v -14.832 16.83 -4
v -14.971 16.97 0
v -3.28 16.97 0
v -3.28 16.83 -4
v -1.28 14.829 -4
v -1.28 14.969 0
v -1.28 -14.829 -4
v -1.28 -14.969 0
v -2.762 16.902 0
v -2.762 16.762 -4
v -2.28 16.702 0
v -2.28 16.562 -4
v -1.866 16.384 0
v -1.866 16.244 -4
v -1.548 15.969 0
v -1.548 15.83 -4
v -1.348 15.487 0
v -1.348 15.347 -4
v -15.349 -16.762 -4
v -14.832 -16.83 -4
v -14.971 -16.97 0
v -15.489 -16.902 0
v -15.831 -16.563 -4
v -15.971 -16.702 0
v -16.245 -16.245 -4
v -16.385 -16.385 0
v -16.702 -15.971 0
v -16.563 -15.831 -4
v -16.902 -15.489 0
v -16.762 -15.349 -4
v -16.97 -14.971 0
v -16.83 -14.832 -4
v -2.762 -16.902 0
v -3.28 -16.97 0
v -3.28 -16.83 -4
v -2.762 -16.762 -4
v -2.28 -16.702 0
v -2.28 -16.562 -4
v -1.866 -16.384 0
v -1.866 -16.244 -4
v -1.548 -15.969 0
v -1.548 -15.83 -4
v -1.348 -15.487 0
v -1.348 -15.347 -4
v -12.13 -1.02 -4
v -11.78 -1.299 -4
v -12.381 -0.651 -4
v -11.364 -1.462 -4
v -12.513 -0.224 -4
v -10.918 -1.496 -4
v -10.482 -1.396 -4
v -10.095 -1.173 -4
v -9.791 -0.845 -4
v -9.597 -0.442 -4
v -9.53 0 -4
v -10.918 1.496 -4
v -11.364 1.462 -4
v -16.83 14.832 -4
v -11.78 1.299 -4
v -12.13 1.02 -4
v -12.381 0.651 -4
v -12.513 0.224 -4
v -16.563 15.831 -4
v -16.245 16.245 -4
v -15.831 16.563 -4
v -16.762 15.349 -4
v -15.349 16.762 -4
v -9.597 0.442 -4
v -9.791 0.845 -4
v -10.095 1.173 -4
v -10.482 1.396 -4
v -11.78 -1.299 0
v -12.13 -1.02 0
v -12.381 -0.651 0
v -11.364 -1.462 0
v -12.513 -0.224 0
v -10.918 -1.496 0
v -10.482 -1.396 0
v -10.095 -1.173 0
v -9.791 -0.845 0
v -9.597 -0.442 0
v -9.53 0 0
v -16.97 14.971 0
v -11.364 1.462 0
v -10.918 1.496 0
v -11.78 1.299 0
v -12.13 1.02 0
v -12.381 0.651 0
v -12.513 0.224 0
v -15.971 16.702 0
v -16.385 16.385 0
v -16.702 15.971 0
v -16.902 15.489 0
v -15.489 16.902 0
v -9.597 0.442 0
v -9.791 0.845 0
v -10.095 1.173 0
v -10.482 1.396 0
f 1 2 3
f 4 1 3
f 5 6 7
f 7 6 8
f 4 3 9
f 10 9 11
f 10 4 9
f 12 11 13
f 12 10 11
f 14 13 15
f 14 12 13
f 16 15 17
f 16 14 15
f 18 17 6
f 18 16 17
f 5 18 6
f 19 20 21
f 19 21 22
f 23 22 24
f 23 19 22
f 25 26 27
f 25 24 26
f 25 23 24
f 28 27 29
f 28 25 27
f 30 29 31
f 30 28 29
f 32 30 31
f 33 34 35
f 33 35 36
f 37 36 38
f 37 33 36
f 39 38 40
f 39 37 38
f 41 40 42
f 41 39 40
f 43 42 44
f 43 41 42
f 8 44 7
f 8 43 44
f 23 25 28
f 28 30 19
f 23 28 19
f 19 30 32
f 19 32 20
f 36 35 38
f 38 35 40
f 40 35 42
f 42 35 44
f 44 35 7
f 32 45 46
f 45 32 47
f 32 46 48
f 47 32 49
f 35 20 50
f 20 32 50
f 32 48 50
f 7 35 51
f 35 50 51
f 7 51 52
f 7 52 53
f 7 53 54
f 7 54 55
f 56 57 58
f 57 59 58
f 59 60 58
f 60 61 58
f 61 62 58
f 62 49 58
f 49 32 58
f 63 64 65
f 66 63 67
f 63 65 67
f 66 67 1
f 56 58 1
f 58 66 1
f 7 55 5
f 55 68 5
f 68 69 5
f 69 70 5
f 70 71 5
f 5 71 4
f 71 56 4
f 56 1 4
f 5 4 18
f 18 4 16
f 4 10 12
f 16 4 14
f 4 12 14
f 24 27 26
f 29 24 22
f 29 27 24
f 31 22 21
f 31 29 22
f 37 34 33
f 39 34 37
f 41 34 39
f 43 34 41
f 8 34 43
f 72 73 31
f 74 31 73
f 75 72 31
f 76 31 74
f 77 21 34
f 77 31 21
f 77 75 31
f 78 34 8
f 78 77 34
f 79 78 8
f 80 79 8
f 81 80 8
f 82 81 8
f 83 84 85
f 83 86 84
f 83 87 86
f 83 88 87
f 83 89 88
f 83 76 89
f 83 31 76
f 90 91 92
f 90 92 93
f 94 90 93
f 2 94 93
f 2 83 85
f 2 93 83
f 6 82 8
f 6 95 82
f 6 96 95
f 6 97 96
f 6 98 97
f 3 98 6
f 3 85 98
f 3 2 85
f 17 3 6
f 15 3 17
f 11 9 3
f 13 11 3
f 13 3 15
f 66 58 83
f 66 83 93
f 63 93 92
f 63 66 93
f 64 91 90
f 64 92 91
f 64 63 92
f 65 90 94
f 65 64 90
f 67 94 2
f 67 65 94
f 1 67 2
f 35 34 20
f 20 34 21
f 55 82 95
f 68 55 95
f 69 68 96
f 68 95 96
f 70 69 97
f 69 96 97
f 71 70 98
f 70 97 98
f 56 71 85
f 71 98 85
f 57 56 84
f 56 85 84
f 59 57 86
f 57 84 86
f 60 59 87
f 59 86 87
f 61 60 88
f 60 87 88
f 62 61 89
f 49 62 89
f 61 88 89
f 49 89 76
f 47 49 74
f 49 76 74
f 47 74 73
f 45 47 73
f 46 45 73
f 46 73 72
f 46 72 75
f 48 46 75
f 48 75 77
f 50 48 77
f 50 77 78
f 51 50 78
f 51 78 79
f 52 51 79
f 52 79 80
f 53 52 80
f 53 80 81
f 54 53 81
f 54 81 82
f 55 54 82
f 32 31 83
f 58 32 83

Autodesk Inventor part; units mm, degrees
ref_plane "YZ Plane" through (0, 0, 0) normal (1, 0, 0) x (0, 1, 0)
ref_plane "XZ Plane" through (0, 0, 0) normal (0, 1, 0) x (-1, 0, 0)
ref_plane "XY Plane" through (0, 0, 0) normal (0, 0, 1) x (1, 0, 0)
ref_plane "Arbeitsebene1" through (0, 0, 0) normal (0, 0, 1) x (1, 0, 0)
sketch "Skizze1" plane through (0, 0, 0) normal (0, 0, 1) x (1, 0, 0)
  line L0 (20.3781, -18.1328) -> (23.4454, -18.9546) construction
  line L1 (23.4454, -18.9546) -> (24.2672, -22.0219) construction
  line L2 (24.2672, -22.0219) -> (22.0219, -24.2672) construction
  line L3 (22.0219, -24.2672) -> (18.9546, -23.4454) construction
  line L4 (18.9546, -23.4454) -> (18.1328, -20.3781) construction
  line L5 (18.1328, -20.3781) -> (20.3781, -18.1328) construction
  line L6 (-24.2672, 22.0219) -> (-22.0219, 24.2672) construction
  line L7 (-22.0219, 24.2672) -> (-18.9546, 23.4454) construction
  line L8 (-18.9546, 23.4454) -> (-18.1328, 20.3781) construction
  line L9 (-18.1328, 20.3781) -> (-20.3781, 18.1328) construction
  line L10 (-20.3781, 18.1328) -> (-23.4454, 18.9546) construction
  line L11 (-23.4454, 18.9546) -> (-24.2672, 22.0219) construction
  circle A0 centre (20.66, 14.3) radius 2.475 construction
  circle A1 centre (14.3, -20.66) radius 2.475 construction
  circle A2 centre (-20.66, -14.3) radius 2.475 construction
  circle A3 centre (-14.3, 20.66) radius 2.475 construction
  circle A4 centre (14.3, 20.66) radius 2.475 construction
  circle A5 centre (-20.66, 14.3) radius 2.475 construction
  circle A6 centre (-14.3, -20.66) radius 2.475 construction
  circle A7 centre (20.66, -14.3) radius 2.475 construction
  arc A8 (-8.8, -18.96) -> (-8.8, -22.36) centre (-8.8, -20.66) ccw construction
  line L12 (-8.8, -18.96) -> (8.8, -18.96) construction
  arc A9 (8.8, -22.36) -> (8.8, -18.96) centre (8.8, -20.66) ccw construction
  line L13 (8.8, -22.36) -> (-8.8, -22.36) construction
  arc A10 (-8.8, 22.36) -> (-8.8, 18.96) centre (-8.8, 20.66) ccw construction
  line L14 (-8.8, 22.36) -> (8.8, 22.36) construction
  arc A11 (8.8, 18.96) -> (8.8, 22.36) centre (8.8, 20.66) ccw construction
  line L15 (8.8, 18.96) -> (-8.8, 18.96) construction
  arc A12 (-18.96, 8.8) -> (-22.36, 8.8) centre (-20.66, 8.8) ccw construction
  line L16 (-18.96, 8.8) -> (-18.96, -8.8) construction
  arc A13 (-22.36, -8.8) -> (-18.96, -8.8) centre (-20.66, -8.8) ccw construction
  line L17 (-22.36, -8.8) -> (-22.36, 8.8) construction
  arc A14 (18.96, -8.8) -> (22.36, -8.8) centre (20.66, -8.8) ccw construction
  line L18 (18.96, -8.8) -> (18.96, 8.8) construction
  arc A15 (22.36, 8.8) -> (18.96, 8.8) centre (20.66, 8.8) ccw construction
  line L19 (22.36, 8.8) -> (22.36, -8.8) construction
  line L20 (-16.97, -16.97) -> (-16.97, 16.97) construction
  line L21 (-16.97, 16.97) -> (16.97, 16.97) construction
  line L22 (16.97, 16.97) -> (16.97, -16.97) construction
  line L23 (16.97, -16.97) -> (-16.97, -16.97) construction
  circle A16 centre (-21.2, -21.2) radius 2.75 construction
  circle A17 centre (21.2, 21.2) radius 2.75 construction
  arc A18 (-24.35, -22.85) -> (-22.85, -24.35) centre (-22.85, -22.85) ccw construction
  line L24 (22.85, -24.35) -> (-22.85, -24.35) construction
  arc A19 (22.85, -24.35) -> (24.35, -22.85) centre (22.85, -22.85) ccw construction
  line L25 (24.35, 22.85) -> (24.35, -22.85) construction
  arc A20 (24.35, 22.85) -> (22.85, 24.35) centre (22.85, 22.85) ccw construction
  line L26 (-22.85, 24.35) -> (22.85, 24.35) construction
  arc A21 (-22.85, 24.35) -> (-24.35, 22.85) centre (-22.85, 22.85) ccw construction
  line L27 (-24.35, -22.85) -> (-24.35, 22.85) construction
  line L28 (-16.97, 16.97) -> (16.97, 16.97)
  line L29 (16.97, 16.97) -> (16.97, -16.97)
  line L30 (16.97, -16.97) -> (-16.97, -16.97)
  line L31 (-16.97, -16.97) -> (-16.97, 16.97)
  point P0 (0, 0)
extrude "Extrusion1" add sketch "Skizze1" against normal blind 4 draft -2
sketch "Skizze2" plane through (0, 0, 0) normal (0, 0, 1) x (1, 0, 0)
  circle A0 centre (-11.03, 0) radius 2.5 projected
  circle A1 centre (-11.03, 0) radius 1.5
  point P0 (0, 0)
  dimension "d3" = 3
extrude "Extrusion2" cut sketch "Skizze2" against normal blind 4 contours A1
fillet "Rundung1" radius 2 4 edges at (-16.9002, -16.9002, -2) (16.9002, -16.9002, -2) (16.9002, 16.9002, -2) (-16.9002, 16.9002, -2)
sketch "Skizze3" plane through (0, 0, 0) normal (0, 0, 1) x (1, 0, 0)
  circle A0 centre (28.0867, -9.6825) radius 1.4 construction
  circle A1 centre (33.0867, 9.6314) radius 1.4 construction
  circle A2 centre (33.0867, -9.6825) radius 1.4 construction
  circle A3 centre (28.0867, 9.6314) radius 1.4 construction
  circle A4 centre (-11.03, 0) radius 3 construction
  circle A5 centre (0.47, 11.5) radius 1.75 construction
  circle A6 centre (0.47, -11.5) radius 1.75 construction
  line L0 (14.4713, 6.5256) -> (36.5731, 6.5256) construction
  line L1 (36.5731, 16.4952) -> (36.5731, 6.5256) construction
  line L2 (-2.8633, 16.4952) -> (36.5731, 16.4952) construction
  line L3 (-24.53, 3.4952) -> (-2.8633, 16.4952) construction
  line L4 (-24.53, 3.4952) -> (-24.53, -3.4952) construction
  line L5 (-24.53, -3.4952) -> (-2.8633, -16.4952) construction
  line L6 (-2.8633, -16.4952) -> (36.5731, -16.4952) construction
  line L7 (36.5731, -16.4952) -> (36.5731, -6.4744) construction
  line L8 (36.5731, -6.4744) -> (14.4713, -6.4744) construction
  line L9 (14.4713, -6.4744) -> (14.4713, -13.5) construction
  line L10 (14.4713, -13.5) -> (4.1713, -13.5) construction
  line L11 (4.1713, -13.5) -> (4.1713, 13.5) construction
  line L12 (4.1713, 13.5) -> (14.4713, 13.5) construction
  line L13 (14.4713, 13.5) -> (14.4713, 6.5256) construction
  circle A7 centre (-11.03, 0) radius 1.5 construction
  ellipse E0 centre (-14.9688, 14.9688) end of major axis (-16.3847, 16.3847) minor radius 2 (-14.9712, 16.97) -> (-16.97, 14.9712) ccw construction
  line L14 (-16.97, 14.9712) -> (-16.97, -14.9712) construction
  ellipse E1 centre (-14.9688, -14.9688) end of major axis (-16.3847, -16.3847) minor radius 2 (-16.97, -14.9712) -> (-14.9712, -16.97) ccw construction
  line L15 (-14.9712, -16.97) -> (14.9712, -16.97) construction
  ellipse E2 centre (14.9688, -14.9688) end of major axis (16.3847, -16.3847) minor radius 2 (14.9712, -16.97) -> (16.97, -14.9712) ccw construction
  line L16 (16.97, -14.9712) -> (16.97, 14.9712) construction
  ellipse E3 centre (14.9688, 14.9688) end of major axis (16.3847, 16.3847) minor radius 2 (16.97, 14.9712) -> (14.9712, 16.97) ccw construction
  line L17 (14.9712, 16.97) -> (-14.9712, 16.97) construction
  line L18 (-14.8315, -16.8303) -> (14.8315, -16.8303) projected
  line L19 (16.97, 16.97) -> (-1.28, 16.97)
  line L20 (-1.28, 16.97) -> (-1.28, -16.8303)
  line L21 (-1.28, -16.8303) -> (16.97, -16.8303)
  line L22 (16.97, -16.8303) -> (16.97, 16.97)
  line L23 (-14.9712, -16.97) -> (14.9712, -16.97) projected
  line L24 (16.97, -16.8303) -> (-1.28, -16.8303)
  line L25 (-1.28, -16.8303) -> (-1.28, -16.97)
  line L26 (-1.28, -16.97) -> (16.97, -16.97)
  line L27 (16.97, -16.97) -> (16.97, -16.8303)
  point P0 (0, 0)
  point P1 (14.8315, -16.8303)
extrude "Extrusion3" cut sketch "Skizze3" against normal blind 4
fillet "Rundung2" radius 2 2 edges at (-1.28, -16.9002, -2) (-1.28, 16.9002, -2)
properties part number "30_Cube_Z_Focus_MGN_NEMA_counterplate_inner"
